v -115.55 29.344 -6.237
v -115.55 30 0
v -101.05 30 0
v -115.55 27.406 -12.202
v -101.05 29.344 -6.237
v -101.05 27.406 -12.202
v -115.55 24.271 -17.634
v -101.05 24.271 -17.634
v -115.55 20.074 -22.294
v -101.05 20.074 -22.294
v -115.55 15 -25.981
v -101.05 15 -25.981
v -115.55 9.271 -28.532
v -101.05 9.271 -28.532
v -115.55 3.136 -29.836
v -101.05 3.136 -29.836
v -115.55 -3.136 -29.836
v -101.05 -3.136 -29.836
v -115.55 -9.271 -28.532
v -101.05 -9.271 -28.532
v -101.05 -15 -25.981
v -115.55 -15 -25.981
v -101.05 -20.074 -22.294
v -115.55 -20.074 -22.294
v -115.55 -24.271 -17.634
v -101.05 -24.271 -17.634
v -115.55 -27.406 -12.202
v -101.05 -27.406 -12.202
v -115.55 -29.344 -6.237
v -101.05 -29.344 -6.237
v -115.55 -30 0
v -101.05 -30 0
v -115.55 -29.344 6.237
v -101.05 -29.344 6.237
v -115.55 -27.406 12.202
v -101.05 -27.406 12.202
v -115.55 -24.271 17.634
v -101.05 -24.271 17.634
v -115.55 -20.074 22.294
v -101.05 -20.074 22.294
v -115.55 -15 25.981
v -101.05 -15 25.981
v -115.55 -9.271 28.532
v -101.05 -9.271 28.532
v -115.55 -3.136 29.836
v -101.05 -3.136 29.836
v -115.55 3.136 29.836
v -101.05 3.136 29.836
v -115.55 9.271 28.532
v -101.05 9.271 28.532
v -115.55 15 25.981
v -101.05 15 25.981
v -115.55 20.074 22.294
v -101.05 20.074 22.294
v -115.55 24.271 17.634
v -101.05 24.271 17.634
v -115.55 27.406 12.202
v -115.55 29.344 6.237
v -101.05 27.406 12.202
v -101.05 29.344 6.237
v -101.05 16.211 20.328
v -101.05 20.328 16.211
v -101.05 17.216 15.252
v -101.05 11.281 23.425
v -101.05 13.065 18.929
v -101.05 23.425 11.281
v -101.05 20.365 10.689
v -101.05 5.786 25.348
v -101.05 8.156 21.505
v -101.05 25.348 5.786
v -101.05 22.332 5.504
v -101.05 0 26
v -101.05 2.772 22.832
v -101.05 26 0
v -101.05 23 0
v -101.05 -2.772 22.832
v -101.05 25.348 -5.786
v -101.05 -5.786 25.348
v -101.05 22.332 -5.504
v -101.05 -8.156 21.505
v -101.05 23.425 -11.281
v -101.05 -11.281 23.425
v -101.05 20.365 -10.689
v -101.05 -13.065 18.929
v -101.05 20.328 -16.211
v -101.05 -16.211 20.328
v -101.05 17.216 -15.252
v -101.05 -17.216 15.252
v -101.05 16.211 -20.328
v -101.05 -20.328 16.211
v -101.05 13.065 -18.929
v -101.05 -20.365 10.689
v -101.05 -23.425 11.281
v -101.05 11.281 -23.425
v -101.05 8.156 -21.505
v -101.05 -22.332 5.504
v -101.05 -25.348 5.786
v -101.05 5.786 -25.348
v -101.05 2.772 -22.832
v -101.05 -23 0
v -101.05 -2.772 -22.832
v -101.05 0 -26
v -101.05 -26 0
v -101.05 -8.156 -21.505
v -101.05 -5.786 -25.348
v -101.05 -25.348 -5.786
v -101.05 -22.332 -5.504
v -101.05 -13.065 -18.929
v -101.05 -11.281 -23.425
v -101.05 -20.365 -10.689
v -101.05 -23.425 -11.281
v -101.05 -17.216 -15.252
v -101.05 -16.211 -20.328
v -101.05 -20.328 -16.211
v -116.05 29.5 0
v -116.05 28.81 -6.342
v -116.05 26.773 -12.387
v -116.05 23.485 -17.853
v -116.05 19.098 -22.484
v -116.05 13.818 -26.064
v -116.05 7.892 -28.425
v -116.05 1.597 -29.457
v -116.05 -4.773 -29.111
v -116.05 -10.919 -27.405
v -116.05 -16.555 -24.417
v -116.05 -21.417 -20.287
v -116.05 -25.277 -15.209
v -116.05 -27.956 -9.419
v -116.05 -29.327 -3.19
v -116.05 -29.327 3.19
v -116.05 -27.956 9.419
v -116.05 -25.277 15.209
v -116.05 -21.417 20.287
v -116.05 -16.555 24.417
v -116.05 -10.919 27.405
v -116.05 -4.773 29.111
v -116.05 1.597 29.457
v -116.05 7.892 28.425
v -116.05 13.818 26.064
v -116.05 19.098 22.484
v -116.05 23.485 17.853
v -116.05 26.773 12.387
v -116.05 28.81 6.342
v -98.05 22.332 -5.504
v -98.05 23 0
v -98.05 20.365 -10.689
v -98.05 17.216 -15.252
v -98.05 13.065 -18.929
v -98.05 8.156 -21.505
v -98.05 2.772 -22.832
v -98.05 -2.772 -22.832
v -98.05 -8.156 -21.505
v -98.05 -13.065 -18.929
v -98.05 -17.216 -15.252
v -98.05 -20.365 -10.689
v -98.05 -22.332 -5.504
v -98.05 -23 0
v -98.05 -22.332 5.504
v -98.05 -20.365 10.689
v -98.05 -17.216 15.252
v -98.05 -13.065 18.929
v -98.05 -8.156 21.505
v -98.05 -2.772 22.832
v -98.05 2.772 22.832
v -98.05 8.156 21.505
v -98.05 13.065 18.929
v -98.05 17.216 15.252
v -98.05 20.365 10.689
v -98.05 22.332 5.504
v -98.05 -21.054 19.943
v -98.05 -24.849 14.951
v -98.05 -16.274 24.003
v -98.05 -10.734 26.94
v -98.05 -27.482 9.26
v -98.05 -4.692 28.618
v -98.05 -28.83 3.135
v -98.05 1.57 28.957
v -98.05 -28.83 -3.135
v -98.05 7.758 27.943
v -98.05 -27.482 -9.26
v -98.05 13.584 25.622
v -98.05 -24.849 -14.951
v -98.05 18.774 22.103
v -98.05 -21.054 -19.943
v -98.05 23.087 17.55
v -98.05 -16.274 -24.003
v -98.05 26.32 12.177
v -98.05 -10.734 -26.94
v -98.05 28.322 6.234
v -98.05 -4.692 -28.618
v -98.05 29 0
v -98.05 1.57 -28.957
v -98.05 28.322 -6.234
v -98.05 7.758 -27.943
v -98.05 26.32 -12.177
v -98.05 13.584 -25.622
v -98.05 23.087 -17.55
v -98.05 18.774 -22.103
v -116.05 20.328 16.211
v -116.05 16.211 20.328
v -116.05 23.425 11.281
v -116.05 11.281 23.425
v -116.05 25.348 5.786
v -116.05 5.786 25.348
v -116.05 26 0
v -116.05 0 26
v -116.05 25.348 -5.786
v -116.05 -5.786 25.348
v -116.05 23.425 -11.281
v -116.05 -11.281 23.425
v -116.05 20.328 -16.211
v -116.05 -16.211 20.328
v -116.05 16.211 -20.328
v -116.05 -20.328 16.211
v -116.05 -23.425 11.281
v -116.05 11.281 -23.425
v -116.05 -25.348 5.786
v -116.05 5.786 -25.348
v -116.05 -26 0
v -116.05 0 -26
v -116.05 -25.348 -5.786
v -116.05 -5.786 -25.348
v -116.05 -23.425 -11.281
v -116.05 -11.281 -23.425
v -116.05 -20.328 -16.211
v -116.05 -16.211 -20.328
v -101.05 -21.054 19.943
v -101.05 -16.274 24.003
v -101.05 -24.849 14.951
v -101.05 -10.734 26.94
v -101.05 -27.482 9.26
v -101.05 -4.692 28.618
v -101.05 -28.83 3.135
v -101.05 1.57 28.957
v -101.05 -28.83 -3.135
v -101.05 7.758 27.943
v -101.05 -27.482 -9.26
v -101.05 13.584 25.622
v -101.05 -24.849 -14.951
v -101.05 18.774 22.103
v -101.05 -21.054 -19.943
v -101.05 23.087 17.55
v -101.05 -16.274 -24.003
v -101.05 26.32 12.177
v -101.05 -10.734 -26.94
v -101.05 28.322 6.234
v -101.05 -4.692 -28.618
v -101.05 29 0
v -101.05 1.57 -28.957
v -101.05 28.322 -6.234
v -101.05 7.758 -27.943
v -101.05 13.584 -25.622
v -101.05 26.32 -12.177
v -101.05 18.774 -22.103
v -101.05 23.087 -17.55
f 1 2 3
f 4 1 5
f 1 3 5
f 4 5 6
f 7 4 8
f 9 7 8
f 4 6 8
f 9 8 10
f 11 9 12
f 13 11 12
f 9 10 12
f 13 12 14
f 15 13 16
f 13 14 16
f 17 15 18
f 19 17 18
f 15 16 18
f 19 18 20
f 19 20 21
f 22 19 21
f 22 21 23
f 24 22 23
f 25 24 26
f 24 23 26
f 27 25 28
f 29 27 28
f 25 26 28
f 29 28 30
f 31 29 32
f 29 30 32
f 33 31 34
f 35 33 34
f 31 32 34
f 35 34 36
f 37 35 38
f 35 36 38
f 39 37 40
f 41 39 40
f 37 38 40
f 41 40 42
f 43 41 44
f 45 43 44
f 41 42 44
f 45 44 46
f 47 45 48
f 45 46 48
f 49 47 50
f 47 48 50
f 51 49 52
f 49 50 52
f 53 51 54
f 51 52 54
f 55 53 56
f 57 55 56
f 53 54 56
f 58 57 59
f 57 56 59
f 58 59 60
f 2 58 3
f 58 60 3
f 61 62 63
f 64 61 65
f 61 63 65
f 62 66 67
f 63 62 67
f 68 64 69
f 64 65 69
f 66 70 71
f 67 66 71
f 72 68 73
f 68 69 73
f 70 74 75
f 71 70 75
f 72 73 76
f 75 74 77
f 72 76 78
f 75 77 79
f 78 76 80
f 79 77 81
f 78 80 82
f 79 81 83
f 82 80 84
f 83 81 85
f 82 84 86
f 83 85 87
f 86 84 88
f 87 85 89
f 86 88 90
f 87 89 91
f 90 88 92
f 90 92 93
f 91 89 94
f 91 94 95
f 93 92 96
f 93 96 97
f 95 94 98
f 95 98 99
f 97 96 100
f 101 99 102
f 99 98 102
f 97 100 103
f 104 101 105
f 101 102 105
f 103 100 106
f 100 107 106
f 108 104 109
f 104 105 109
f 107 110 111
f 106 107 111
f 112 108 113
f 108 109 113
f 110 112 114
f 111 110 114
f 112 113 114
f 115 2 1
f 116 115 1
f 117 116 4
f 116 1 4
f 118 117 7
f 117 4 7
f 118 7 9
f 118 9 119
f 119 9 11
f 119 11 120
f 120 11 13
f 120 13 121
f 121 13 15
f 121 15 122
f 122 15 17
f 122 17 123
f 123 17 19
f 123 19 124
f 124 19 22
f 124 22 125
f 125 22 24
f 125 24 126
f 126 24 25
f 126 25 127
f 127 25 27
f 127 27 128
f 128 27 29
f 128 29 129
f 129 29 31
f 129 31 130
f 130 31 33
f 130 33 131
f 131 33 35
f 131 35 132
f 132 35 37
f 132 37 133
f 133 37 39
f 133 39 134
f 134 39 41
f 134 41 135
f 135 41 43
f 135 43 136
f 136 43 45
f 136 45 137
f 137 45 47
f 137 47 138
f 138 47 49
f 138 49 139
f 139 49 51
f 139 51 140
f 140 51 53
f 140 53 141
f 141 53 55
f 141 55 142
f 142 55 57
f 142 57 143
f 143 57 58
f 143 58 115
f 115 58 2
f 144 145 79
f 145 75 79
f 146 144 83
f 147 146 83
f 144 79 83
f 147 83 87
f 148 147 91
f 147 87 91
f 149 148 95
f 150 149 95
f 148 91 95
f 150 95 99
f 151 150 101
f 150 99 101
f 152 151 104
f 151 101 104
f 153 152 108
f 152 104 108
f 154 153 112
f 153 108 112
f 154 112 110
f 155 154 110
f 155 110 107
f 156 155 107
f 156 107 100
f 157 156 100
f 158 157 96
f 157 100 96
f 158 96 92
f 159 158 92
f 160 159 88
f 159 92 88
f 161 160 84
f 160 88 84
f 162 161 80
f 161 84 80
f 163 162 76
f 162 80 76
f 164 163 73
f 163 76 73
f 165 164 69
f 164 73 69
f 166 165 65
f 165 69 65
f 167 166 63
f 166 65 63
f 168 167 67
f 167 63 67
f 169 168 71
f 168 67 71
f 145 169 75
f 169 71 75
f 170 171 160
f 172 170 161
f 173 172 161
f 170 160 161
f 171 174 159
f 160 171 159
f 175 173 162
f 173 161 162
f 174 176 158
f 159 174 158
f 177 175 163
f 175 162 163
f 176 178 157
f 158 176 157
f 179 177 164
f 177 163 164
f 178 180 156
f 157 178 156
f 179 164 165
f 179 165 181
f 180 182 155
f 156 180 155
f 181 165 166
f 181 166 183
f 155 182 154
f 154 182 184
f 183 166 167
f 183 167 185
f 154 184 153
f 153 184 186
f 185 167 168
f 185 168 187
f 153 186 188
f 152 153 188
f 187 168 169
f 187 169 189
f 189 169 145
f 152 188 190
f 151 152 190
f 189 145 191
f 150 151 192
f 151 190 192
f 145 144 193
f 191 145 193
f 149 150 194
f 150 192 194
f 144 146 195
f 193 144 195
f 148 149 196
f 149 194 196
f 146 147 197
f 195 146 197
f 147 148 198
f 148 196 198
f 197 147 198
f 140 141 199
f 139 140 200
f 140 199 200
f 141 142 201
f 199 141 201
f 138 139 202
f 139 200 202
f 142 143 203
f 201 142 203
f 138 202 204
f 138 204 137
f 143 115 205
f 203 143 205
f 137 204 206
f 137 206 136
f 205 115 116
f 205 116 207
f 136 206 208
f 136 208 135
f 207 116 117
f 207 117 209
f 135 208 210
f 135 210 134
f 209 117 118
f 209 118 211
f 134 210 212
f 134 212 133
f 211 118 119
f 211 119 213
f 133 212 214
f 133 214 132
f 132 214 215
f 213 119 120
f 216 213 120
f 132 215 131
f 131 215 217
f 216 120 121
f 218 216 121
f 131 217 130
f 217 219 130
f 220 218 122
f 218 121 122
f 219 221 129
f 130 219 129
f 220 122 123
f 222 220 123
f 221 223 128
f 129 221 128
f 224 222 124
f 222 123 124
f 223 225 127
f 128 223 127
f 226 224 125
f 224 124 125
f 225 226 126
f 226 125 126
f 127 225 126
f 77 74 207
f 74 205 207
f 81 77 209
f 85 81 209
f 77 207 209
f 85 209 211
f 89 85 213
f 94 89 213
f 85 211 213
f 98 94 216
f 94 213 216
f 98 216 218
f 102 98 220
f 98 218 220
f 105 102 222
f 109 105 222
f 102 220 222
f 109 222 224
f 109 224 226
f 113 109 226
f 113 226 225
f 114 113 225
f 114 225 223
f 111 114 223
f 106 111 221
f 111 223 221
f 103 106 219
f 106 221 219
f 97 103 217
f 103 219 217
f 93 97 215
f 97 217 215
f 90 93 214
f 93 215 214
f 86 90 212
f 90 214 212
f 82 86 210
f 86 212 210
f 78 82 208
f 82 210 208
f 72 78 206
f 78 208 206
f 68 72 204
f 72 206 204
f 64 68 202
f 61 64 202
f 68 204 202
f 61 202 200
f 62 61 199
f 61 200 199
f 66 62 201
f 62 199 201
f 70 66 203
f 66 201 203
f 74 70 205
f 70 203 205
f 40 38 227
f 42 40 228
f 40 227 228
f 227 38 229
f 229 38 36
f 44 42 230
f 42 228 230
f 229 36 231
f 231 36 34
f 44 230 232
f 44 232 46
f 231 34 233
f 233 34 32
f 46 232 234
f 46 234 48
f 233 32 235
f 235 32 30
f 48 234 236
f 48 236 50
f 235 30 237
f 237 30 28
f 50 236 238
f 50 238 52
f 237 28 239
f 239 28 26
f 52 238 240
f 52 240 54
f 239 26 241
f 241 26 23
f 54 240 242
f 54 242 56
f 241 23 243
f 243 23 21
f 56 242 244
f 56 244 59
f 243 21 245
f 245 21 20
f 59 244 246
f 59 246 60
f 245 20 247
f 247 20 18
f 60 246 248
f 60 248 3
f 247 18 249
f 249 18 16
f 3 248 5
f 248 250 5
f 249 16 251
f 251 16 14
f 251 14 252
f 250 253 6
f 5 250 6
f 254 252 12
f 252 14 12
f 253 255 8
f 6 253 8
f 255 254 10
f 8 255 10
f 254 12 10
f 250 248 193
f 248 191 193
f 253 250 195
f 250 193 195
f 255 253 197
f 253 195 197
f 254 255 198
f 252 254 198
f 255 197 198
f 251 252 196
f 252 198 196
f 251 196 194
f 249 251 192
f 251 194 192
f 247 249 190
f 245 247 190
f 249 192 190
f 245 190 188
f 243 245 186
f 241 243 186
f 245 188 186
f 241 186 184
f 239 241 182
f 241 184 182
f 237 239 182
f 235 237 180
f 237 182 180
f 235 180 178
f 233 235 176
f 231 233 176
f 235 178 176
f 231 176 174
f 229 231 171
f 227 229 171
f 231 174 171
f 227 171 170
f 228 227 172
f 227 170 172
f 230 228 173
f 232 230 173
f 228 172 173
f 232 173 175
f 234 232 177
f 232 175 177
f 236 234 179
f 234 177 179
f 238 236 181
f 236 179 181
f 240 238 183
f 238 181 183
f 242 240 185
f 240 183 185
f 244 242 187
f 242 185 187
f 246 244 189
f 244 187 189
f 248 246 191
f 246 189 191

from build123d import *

# Parameters (mm, degrees)
CHAMFER_1_SIZE = 0.5


with BuildPart() as part:
    # Эскиз1 → Повернуть1 (revolve)
    with BuildSketch(Plane.XY):
        Polygon((-98.05, 23), (-101.05, 23), (-101.05, 26), (-116.05, 26), (-116.05, 30), (-101.05, 30), (-101.05, 29), (-98.05, 29), align=None)
    revolve(axis=Axis((-108.55, 0, 0), (-1, 0, 0)))

    # Фаска1
    chamfer_1_edges = [part.edges().sort_by_distance(p)[0] for p in [
        (-116.05, -30, 0),
    ]]
    chamfer(chamfer_1_edges, length=CHAMFER_1_SIZE)


solid = part.part
